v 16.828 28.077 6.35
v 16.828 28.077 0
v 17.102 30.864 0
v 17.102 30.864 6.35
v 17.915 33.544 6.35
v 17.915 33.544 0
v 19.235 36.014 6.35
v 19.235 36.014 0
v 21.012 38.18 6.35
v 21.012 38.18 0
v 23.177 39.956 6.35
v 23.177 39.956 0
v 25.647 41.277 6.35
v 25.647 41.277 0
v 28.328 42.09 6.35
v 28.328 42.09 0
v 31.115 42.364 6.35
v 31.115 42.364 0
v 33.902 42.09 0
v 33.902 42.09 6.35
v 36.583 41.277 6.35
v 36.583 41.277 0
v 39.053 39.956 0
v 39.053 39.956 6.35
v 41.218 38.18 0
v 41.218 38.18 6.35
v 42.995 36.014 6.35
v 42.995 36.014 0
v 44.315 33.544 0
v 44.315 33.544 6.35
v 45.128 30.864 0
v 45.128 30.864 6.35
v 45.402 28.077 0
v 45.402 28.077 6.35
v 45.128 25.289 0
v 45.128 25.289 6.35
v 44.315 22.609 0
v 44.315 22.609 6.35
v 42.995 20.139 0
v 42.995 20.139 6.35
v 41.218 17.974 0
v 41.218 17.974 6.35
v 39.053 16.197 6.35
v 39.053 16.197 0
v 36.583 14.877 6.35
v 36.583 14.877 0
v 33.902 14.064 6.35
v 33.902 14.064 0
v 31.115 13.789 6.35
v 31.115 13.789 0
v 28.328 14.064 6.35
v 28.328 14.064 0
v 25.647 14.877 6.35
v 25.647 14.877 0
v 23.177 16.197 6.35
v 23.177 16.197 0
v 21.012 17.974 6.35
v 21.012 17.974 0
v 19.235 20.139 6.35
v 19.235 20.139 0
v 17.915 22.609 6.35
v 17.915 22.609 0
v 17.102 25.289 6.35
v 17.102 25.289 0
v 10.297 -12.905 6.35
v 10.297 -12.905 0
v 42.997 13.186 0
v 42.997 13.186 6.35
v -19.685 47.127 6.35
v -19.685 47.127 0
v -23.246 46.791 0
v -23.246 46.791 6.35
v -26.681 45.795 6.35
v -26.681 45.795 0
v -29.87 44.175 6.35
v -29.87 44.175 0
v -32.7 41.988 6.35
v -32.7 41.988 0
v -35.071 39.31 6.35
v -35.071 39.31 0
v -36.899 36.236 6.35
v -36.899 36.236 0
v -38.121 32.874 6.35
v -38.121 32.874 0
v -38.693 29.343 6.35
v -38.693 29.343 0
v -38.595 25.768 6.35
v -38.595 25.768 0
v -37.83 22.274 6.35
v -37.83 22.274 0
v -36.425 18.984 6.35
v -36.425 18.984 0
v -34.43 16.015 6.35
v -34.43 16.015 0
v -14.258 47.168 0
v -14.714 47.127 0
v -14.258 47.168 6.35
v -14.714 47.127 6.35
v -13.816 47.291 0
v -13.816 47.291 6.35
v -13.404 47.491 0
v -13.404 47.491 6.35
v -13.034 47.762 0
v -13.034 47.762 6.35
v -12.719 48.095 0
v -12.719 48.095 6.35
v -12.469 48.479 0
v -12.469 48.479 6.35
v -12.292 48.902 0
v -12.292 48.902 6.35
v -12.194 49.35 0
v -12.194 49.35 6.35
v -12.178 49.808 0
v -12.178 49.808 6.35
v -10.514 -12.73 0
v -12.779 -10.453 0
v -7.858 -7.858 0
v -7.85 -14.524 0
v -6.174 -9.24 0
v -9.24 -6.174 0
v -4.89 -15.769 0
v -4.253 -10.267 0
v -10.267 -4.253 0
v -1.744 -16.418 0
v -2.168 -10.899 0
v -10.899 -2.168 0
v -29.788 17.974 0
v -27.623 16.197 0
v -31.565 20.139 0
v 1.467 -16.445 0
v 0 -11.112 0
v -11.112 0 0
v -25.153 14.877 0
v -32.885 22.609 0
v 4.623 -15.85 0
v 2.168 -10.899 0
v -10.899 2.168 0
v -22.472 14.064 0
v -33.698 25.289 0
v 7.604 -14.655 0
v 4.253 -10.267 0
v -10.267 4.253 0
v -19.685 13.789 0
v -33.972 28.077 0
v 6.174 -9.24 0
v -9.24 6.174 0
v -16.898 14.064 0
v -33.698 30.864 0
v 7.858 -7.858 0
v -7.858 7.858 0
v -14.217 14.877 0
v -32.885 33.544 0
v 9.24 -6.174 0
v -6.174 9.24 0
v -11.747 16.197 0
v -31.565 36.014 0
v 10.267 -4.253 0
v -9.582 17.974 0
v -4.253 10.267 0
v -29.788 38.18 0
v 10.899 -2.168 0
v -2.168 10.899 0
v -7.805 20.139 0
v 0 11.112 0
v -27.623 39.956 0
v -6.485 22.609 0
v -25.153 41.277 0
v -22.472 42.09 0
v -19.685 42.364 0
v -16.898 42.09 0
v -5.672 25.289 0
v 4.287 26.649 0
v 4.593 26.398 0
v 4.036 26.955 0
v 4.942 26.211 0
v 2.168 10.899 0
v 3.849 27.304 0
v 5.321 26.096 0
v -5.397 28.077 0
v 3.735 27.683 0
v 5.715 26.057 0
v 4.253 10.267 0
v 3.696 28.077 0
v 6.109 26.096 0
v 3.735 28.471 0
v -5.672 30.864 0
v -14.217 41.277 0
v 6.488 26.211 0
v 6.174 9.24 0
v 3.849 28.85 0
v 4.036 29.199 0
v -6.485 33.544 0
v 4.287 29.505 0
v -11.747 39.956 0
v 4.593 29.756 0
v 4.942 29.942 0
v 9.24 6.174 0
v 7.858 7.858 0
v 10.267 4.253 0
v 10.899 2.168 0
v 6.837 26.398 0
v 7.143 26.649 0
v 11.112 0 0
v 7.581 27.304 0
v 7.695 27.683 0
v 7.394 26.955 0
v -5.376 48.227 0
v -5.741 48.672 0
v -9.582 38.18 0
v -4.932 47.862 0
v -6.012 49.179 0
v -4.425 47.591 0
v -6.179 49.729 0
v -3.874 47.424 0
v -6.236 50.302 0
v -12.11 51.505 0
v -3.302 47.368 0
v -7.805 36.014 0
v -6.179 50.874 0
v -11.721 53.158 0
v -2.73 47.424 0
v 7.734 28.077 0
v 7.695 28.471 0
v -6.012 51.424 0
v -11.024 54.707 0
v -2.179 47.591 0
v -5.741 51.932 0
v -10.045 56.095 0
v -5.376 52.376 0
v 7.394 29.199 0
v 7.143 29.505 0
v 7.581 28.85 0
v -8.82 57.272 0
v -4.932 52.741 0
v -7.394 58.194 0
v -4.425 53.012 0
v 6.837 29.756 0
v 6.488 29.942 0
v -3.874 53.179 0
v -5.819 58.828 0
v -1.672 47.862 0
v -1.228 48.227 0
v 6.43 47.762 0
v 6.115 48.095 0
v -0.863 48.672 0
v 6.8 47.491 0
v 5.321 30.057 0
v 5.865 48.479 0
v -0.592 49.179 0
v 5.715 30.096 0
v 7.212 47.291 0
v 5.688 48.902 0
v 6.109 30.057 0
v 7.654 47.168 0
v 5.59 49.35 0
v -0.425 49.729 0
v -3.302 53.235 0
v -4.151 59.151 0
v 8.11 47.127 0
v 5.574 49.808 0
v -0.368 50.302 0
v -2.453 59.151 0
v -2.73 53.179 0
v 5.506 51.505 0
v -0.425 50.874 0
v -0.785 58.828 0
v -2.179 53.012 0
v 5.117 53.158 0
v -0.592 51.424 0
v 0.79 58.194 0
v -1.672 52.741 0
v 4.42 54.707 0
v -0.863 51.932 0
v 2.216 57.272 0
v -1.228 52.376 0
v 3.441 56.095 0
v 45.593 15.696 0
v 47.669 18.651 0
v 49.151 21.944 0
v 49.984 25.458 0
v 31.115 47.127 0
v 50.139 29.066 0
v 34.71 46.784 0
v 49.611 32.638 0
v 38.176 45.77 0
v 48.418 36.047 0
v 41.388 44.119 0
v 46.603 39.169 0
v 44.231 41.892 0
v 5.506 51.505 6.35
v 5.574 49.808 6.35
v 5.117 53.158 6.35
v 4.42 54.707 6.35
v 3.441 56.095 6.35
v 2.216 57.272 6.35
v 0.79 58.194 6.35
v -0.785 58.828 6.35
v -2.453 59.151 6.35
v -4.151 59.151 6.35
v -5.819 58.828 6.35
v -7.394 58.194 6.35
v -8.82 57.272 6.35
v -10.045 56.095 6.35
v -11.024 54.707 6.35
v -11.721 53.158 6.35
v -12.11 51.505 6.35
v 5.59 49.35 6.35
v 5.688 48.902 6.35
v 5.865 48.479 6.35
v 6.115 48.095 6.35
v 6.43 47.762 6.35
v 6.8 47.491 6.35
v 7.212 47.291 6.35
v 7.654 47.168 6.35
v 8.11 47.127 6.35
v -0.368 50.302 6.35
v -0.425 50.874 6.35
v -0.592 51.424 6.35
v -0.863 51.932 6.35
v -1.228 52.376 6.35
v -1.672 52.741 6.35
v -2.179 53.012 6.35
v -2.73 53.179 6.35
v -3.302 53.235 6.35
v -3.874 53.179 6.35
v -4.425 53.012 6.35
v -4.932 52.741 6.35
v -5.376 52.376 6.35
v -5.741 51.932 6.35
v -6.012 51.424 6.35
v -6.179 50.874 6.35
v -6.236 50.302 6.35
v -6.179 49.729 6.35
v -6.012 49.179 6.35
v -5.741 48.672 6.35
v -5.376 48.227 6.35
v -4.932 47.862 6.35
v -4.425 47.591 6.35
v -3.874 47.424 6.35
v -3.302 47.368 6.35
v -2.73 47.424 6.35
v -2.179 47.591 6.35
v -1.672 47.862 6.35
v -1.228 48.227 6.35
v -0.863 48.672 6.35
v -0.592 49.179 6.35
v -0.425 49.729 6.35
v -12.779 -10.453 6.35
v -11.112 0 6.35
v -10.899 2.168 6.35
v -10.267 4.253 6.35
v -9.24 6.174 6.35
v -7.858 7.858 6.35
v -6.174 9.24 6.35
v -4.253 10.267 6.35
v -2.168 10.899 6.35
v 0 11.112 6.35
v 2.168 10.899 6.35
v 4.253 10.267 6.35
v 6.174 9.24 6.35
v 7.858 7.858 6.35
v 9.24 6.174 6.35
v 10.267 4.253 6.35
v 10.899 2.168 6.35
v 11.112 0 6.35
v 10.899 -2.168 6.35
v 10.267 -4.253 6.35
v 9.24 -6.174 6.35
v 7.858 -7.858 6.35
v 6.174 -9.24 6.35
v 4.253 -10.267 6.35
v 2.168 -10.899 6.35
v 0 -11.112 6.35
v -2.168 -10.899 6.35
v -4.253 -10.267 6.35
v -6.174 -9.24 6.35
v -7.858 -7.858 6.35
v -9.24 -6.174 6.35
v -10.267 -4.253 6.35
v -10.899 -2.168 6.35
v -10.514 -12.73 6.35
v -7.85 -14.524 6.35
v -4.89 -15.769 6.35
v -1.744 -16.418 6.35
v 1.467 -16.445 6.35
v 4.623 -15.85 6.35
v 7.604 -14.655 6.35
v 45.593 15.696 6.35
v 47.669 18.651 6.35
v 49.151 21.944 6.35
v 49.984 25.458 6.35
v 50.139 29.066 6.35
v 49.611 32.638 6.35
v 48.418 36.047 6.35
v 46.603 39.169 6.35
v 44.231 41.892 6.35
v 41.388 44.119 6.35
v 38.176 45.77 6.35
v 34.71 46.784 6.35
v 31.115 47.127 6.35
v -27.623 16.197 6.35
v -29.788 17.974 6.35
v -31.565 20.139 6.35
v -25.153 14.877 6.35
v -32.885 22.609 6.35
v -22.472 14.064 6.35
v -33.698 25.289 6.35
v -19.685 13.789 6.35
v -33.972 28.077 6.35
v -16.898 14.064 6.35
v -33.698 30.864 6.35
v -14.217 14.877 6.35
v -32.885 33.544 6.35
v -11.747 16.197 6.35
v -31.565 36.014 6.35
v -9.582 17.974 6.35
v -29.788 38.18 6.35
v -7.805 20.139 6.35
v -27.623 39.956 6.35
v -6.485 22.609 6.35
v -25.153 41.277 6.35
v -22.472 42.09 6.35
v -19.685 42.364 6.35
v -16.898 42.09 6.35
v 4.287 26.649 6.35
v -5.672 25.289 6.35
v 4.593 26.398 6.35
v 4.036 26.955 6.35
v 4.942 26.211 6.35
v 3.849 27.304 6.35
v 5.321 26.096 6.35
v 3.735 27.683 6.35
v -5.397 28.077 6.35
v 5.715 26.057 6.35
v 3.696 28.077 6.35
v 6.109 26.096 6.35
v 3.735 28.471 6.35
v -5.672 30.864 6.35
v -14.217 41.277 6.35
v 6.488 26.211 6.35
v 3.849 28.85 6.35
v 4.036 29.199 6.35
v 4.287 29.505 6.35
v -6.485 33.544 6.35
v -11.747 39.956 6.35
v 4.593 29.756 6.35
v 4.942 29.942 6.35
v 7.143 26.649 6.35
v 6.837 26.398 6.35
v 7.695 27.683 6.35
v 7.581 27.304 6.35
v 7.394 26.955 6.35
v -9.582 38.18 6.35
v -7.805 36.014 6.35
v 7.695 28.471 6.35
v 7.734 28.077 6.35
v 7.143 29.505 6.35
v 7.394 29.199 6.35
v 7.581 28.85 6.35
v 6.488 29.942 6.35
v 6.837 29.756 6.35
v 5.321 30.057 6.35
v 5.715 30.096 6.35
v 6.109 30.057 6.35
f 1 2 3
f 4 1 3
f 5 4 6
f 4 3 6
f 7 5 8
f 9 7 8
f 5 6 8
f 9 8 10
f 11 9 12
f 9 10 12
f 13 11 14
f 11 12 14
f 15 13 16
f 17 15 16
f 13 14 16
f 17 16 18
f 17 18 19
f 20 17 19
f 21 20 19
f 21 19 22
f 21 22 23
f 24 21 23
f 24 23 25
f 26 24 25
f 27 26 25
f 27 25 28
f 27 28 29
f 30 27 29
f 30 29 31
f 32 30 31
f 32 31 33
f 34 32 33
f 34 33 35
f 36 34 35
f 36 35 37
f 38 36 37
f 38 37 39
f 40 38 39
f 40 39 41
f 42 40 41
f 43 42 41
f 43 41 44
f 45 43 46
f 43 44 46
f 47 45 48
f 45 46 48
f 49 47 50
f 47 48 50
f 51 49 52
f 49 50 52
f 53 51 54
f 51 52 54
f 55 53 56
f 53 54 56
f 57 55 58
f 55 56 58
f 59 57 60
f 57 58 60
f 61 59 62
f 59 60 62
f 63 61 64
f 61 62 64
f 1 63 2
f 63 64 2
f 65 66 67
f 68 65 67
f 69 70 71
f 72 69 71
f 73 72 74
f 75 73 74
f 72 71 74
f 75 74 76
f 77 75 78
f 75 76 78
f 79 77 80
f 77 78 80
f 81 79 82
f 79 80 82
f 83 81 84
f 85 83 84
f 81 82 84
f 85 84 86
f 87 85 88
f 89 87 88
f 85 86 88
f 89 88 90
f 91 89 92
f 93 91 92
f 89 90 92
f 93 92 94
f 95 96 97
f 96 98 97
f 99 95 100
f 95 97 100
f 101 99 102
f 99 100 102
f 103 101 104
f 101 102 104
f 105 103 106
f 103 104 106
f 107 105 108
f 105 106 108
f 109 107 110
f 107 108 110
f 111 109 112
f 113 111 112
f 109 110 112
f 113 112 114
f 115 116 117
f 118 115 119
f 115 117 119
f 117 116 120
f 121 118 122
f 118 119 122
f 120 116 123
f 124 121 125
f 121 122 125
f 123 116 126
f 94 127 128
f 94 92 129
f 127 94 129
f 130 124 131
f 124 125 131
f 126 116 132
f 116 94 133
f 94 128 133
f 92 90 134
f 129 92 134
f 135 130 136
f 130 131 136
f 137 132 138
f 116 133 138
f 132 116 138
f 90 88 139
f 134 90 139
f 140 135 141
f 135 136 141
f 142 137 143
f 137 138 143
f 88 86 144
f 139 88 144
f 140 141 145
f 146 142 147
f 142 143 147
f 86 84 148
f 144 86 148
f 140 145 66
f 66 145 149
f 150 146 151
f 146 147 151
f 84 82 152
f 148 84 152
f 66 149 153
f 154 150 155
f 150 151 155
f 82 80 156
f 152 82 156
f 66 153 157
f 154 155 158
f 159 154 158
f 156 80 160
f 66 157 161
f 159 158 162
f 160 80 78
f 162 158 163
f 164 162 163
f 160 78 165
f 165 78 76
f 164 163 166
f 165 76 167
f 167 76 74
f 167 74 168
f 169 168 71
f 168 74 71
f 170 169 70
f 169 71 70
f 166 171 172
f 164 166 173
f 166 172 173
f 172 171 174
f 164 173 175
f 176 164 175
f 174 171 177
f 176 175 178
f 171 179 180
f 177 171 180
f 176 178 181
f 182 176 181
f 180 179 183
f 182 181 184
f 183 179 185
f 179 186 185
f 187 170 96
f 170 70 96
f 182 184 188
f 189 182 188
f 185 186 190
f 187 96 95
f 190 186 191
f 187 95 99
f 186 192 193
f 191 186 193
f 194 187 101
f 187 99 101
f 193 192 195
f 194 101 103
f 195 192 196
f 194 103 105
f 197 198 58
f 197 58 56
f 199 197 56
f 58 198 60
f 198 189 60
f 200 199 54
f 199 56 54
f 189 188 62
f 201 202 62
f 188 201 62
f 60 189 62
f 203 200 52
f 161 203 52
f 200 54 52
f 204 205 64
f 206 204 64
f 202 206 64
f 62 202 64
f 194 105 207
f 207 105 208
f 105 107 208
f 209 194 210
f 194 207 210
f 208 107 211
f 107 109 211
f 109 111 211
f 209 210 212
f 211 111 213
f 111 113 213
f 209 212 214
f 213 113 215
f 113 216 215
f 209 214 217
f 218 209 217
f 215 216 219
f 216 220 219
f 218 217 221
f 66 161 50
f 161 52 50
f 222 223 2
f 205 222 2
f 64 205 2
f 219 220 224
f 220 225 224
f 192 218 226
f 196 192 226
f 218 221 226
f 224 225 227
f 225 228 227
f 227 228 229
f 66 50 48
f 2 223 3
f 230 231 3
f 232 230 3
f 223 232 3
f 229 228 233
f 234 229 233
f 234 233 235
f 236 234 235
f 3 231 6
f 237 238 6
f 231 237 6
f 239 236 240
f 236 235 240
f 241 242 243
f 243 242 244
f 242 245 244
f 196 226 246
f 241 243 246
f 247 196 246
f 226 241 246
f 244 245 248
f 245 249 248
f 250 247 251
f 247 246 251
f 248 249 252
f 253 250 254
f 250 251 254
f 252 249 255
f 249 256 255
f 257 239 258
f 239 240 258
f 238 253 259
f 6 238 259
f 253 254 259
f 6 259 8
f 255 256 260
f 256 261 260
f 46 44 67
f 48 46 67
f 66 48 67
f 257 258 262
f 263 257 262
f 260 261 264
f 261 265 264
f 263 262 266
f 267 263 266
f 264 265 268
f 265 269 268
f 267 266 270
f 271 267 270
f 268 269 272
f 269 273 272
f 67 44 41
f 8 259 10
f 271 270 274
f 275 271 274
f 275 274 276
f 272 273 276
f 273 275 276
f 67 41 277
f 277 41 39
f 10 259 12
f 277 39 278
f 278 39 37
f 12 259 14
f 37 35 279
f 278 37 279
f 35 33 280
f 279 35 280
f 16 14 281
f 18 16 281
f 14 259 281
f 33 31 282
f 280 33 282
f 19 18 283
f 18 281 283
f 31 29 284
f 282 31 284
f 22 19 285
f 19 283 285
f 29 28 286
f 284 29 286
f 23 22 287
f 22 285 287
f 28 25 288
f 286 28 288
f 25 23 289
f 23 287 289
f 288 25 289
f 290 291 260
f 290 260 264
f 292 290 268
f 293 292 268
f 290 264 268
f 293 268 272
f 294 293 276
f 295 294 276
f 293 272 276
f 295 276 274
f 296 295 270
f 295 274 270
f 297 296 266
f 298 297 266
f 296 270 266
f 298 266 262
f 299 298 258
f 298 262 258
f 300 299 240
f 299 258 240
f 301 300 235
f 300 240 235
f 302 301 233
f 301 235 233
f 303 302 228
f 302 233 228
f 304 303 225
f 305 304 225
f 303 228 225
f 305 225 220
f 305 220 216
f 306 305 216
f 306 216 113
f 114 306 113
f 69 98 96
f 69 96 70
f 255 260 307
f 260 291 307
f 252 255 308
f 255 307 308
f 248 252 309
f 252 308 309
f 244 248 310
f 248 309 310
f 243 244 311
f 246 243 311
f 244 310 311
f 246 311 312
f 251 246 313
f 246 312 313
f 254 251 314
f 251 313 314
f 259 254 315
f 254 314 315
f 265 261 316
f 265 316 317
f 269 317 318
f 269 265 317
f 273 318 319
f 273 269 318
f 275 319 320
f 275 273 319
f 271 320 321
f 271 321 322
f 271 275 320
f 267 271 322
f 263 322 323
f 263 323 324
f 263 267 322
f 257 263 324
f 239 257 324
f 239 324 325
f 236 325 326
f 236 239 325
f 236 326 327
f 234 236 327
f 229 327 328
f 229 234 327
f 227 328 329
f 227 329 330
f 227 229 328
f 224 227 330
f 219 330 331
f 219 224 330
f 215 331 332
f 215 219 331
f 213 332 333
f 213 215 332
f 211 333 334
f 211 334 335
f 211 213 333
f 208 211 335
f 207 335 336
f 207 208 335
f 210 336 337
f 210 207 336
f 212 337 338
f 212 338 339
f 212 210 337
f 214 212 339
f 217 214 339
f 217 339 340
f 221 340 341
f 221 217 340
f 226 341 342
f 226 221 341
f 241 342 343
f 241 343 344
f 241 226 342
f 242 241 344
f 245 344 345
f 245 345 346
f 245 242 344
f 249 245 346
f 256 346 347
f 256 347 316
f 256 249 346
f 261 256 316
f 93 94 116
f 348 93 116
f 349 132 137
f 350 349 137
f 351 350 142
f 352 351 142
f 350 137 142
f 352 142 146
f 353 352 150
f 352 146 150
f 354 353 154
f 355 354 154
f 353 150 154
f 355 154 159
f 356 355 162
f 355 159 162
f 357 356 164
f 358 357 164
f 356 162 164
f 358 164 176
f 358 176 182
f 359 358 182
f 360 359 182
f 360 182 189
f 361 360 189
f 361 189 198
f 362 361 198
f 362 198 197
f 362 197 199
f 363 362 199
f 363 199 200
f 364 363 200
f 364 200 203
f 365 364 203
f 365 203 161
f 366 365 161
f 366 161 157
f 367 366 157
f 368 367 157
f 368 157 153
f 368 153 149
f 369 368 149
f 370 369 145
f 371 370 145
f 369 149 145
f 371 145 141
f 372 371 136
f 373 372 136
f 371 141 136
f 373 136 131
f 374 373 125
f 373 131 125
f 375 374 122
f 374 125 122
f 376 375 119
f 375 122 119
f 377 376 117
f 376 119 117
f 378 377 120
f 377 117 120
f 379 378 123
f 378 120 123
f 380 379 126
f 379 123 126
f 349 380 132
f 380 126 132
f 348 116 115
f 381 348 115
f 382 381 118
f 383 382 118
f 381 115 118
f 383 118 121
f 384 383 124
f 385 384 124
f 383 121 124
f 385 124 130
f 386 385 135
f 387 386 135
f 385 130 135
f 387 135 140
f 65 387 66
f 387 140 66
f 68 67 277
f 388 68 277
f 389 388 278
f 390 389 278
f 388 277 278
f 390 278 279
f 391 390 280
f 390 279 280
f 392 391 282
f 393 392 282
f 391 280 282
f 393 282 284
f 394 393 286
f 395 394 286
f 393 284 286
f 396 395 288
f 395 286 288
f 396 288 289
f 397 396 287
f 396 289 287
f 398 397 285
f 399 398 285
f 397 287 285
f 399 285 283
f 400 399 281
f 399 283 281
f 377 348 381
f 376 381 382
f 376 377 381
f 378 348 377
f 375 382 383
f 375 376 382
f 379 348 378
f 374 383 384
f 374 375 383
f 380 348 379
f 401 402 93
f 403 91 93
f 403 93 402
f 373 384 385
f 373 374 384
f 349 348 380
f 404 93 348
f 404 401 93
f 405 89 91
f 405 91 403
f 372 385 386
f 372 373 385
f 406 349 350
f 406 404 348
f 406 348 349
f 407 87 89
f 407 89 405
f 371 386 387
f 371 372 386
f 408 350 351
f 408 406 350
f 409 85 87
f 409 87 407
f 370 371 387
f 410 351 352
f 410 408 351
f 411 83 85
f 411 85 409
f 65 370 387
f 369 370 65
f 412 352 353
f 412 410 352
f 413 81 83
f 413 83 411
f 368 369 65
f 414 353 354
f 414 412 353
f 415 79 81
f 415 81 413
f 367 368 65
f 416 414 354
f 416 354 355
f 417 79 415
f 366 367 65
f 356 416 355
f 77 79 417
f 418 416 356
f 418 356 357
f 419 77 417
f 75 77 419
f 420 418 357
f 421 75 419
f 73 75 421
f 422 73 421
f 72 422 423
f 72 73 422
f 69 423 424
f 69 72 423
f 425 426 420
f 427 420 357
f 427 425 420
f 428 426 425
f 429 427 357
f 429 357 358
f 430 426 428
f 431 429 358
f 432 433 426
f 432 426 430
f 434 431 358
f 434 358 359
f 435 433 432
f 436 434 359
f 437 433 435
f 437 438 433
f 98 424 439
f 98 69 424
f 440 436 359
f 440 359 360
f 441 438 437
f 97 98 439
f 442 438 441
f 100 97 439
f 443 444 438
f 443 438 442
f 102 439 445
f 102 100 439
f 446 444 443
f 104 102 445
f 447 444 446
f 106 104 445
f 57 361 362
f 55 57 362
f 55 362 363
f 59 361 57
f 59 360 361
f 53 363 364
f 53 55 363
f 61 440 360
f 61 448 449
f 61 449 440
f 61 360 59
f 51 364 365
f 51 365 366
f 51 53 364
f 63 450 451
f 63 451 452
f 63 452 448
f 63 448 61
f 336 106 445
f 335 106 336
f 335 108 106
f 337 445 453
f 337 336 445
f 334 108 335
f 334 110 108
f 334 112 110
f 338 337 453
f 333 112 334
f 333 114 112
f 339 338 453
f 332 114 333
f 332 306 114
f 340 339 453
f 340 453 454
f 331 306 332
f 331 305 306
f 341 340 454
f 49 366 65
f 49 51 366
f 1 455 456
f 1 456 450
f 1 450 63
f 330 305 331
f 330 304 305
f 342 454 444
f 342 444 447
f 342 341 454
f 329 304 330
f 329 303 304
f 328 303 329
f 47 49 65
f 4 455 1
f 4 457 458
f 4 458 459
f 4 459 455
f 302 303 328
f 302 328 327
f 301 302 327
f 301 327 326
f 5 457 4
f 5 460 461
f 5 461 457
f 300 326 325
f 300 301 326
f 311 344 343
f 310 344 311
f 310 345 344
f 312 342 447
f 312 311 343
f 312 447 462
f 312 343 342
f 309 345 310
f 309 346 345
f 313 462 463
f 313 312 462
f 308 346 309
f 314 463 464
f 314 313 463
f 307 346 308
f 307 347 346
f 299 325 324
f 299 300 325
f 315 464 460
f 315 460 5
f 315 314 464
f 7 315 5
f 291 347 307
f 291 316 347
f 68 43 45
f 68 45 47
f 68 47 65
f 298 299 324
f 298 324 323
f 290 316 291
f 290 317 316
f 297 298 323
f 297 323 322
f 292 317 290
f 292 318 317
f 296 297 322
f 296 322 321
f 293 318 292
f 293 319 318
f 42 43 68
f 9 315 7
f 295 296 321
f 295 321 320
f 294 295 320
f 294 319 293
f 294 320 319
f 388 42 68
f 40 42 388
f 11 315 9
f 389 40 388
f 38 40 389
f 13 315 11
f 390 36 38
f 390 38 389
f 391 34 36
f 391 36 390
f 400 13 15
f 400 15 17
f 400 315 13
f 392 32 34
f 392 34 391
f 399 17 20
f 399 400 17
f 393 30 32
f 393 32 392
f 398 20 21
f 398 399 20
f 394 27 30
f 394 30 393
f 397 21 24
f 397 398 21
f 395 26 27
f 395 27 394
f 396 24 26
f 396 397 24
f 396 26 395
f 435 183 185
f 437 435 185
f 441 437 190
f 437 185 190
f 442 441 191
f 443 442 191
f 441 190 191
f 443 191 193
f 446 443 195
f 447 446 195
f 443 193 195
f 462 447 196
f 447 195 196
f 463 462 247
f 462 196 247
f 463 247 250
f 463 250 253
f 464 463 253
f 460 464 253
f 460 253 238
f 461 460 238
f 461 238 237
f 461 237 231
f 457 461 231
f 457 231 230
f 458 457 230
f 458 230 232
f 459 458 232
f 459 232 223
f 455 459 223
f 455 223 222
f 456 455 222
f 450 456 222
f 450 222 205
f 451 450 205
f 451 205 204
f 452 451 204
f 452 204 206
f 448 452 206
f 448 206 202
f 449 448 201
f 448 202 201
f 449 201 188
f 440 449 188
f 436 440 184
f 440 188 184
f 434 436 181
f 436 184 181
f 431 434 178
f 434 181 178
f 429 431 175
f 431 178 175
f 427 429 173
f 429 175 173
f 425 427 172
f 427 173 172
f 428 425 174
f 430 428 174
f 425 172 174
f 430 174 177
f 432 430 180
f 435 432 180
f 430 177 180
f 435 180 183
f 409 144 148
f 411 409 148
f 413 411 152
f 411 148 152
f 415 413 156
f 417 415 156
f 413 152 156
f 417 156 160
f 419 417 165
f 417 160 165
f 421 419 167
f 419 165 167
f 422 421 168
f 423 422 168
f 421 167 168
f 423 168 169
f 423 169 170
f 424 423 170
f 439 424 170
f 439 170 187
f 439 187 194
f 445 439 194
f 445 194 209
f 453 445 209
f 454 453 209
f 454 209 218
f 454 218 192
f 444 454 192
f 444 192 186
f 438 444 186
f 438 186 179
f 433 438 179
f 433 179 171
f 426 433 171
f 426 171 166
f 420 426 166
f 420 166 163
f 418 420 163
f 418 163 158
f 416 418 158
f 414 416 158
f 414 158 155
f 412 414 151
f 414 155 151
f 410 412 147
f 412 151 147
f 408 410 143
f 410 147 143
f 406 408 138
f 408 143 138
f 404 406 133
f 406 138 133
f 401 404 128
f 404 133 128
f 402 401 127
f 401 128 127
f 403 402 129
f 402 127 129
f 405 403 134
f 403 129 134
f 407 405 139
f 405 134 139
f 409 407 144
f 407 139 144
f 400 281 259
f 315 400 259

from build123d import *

# Parameters (mm, degrees)
SKETCH1_R                        = 2.9337
BOSS_EXTRUDE1_DEPTH              = 6.35
F_1_1_DIAMETER_HOLE1_D           = 28.575
F_1_1_DIAMETER_HOLE1_DEPTH       = 25.4
F_1_1_DIAMETER_HOLE1_TIP         = 8.584796094
F_7_8_0_875_DIAMETER_HOLE1_D     = 22.225
F_7_8_0_875_DIAMETER_HOLE1_DEPTH = 25.4
F_7_8_0_875_DIAMETER_HOLE1_TIP   = 6.677063629
TAP_DRILL_FOR_10_32_TAP1_D       = 4.0386
FILLET1_R                        = 2.54


with BuildPart() as part:
    # Sketch1 → Boss-Extrude1 (new body)
    with BuildSketch(Plane.XY):
        with BuildLine():
            Line((-11.605702487, 47.126767531), (-19.685, 47.126767531))
            ThreePointArc((-19.685, 47.126767531), (-36.899439748, 36.235539754), (-34.430269589, 16.015278206))
            Line((-34.430269589, 16.015278206), (-12.779233644, -10.453290749))
            ThreePointArc((-12.779233644, -10.453290749), (-1.744405346, -16.417586607), (10.297338688, -12.905228241))
            Line((10.297338688, -12.905228241), (42.996544639, 13.186119561))
            ThreePointArc((42.996544639, 13.186119561), (49.095118796, 34.371036995), (31.115, 47.126767531))
            Line((31.115, 47.126767531), (5.001702487, 47.126767531))
            ThreePointArc((5.001702487, 47.126767531), (-3.302, 59.191767531), (-11.605702487, 47.126767531))
        make_face()
        with Locations((-3.302, 50.301767531)):
            Circle(SKETCH1_R, mode=Mode.SUBTRACT)
    extrude(amount=BOSS_EXTRUDE1_DEPTH)

    # 1 (1) Diameter Hole1
    with Locations(Plane.XY.offset(6.35)):
        with Locations((-19.685, 28.076767531), (31.115, 28.076767531)):
            Hole(F_1_1_DIAMETER_HOLE1_D / 2, depth=F_1_1_DIAMETER_HOLE1_DEPTH)
            with Locations((0, 0, -(F_1_1_DIAMETER_HOLE1_DEPTH + F_1_1_DIAMETER_HOLE1_TIP / 2))):  # 118° drill point
                Cone(0, F_1_1_DIAMETER_HOLE1_D / 2, F_1_1_DIAMETER_HOLE1_TIP, mode=Mode.SUBTRACT)

    # 7/8 (0.875) Diameter Hole1
    with Locations(Plane.XY.offset(6.35)):
        with Locations((0, 0)):
            Hole(F_7_8_0_875_DIAMETER_HOLE1_D / 2, depth=F_7_8_0_875_DIAMETER_HOLE1_DEPTH)
            with Locations((0, 0, -(F_7_8_0_875_DIAMETER_HOLE1_DEPTH + F_7_8_0_875_DIAMETER_HOLE1_TIP / 2))):  # 118° drill point
                Cone(0, F_7_8_0_875_DIAMETER_HOLE1_D / 2, F_7_8_0_875_DIAMETER_HOLE1_TIP, mode=Mode.SUBTRACT)

    # Tap Drill for #10-32 Tap1 (through all)
    with Locations(Plane.XY.offset(6.35)):
        with Locations((5.715, 28.076767531)):
            Hole(TAP_DRILL_FOR_10_32_TAP1_D / 2)

    # Fillet1
    fillet1_edges = [part.edges().sort_by_distance(p)[0] for p in [
        (5.001702487, 47.126767531, 3.175),
        (-11.605702487, 47.126767531, 3.175),
    ]]
    fillet(fillet1_edges, radius=FILLET1_R)


solid = part.part
